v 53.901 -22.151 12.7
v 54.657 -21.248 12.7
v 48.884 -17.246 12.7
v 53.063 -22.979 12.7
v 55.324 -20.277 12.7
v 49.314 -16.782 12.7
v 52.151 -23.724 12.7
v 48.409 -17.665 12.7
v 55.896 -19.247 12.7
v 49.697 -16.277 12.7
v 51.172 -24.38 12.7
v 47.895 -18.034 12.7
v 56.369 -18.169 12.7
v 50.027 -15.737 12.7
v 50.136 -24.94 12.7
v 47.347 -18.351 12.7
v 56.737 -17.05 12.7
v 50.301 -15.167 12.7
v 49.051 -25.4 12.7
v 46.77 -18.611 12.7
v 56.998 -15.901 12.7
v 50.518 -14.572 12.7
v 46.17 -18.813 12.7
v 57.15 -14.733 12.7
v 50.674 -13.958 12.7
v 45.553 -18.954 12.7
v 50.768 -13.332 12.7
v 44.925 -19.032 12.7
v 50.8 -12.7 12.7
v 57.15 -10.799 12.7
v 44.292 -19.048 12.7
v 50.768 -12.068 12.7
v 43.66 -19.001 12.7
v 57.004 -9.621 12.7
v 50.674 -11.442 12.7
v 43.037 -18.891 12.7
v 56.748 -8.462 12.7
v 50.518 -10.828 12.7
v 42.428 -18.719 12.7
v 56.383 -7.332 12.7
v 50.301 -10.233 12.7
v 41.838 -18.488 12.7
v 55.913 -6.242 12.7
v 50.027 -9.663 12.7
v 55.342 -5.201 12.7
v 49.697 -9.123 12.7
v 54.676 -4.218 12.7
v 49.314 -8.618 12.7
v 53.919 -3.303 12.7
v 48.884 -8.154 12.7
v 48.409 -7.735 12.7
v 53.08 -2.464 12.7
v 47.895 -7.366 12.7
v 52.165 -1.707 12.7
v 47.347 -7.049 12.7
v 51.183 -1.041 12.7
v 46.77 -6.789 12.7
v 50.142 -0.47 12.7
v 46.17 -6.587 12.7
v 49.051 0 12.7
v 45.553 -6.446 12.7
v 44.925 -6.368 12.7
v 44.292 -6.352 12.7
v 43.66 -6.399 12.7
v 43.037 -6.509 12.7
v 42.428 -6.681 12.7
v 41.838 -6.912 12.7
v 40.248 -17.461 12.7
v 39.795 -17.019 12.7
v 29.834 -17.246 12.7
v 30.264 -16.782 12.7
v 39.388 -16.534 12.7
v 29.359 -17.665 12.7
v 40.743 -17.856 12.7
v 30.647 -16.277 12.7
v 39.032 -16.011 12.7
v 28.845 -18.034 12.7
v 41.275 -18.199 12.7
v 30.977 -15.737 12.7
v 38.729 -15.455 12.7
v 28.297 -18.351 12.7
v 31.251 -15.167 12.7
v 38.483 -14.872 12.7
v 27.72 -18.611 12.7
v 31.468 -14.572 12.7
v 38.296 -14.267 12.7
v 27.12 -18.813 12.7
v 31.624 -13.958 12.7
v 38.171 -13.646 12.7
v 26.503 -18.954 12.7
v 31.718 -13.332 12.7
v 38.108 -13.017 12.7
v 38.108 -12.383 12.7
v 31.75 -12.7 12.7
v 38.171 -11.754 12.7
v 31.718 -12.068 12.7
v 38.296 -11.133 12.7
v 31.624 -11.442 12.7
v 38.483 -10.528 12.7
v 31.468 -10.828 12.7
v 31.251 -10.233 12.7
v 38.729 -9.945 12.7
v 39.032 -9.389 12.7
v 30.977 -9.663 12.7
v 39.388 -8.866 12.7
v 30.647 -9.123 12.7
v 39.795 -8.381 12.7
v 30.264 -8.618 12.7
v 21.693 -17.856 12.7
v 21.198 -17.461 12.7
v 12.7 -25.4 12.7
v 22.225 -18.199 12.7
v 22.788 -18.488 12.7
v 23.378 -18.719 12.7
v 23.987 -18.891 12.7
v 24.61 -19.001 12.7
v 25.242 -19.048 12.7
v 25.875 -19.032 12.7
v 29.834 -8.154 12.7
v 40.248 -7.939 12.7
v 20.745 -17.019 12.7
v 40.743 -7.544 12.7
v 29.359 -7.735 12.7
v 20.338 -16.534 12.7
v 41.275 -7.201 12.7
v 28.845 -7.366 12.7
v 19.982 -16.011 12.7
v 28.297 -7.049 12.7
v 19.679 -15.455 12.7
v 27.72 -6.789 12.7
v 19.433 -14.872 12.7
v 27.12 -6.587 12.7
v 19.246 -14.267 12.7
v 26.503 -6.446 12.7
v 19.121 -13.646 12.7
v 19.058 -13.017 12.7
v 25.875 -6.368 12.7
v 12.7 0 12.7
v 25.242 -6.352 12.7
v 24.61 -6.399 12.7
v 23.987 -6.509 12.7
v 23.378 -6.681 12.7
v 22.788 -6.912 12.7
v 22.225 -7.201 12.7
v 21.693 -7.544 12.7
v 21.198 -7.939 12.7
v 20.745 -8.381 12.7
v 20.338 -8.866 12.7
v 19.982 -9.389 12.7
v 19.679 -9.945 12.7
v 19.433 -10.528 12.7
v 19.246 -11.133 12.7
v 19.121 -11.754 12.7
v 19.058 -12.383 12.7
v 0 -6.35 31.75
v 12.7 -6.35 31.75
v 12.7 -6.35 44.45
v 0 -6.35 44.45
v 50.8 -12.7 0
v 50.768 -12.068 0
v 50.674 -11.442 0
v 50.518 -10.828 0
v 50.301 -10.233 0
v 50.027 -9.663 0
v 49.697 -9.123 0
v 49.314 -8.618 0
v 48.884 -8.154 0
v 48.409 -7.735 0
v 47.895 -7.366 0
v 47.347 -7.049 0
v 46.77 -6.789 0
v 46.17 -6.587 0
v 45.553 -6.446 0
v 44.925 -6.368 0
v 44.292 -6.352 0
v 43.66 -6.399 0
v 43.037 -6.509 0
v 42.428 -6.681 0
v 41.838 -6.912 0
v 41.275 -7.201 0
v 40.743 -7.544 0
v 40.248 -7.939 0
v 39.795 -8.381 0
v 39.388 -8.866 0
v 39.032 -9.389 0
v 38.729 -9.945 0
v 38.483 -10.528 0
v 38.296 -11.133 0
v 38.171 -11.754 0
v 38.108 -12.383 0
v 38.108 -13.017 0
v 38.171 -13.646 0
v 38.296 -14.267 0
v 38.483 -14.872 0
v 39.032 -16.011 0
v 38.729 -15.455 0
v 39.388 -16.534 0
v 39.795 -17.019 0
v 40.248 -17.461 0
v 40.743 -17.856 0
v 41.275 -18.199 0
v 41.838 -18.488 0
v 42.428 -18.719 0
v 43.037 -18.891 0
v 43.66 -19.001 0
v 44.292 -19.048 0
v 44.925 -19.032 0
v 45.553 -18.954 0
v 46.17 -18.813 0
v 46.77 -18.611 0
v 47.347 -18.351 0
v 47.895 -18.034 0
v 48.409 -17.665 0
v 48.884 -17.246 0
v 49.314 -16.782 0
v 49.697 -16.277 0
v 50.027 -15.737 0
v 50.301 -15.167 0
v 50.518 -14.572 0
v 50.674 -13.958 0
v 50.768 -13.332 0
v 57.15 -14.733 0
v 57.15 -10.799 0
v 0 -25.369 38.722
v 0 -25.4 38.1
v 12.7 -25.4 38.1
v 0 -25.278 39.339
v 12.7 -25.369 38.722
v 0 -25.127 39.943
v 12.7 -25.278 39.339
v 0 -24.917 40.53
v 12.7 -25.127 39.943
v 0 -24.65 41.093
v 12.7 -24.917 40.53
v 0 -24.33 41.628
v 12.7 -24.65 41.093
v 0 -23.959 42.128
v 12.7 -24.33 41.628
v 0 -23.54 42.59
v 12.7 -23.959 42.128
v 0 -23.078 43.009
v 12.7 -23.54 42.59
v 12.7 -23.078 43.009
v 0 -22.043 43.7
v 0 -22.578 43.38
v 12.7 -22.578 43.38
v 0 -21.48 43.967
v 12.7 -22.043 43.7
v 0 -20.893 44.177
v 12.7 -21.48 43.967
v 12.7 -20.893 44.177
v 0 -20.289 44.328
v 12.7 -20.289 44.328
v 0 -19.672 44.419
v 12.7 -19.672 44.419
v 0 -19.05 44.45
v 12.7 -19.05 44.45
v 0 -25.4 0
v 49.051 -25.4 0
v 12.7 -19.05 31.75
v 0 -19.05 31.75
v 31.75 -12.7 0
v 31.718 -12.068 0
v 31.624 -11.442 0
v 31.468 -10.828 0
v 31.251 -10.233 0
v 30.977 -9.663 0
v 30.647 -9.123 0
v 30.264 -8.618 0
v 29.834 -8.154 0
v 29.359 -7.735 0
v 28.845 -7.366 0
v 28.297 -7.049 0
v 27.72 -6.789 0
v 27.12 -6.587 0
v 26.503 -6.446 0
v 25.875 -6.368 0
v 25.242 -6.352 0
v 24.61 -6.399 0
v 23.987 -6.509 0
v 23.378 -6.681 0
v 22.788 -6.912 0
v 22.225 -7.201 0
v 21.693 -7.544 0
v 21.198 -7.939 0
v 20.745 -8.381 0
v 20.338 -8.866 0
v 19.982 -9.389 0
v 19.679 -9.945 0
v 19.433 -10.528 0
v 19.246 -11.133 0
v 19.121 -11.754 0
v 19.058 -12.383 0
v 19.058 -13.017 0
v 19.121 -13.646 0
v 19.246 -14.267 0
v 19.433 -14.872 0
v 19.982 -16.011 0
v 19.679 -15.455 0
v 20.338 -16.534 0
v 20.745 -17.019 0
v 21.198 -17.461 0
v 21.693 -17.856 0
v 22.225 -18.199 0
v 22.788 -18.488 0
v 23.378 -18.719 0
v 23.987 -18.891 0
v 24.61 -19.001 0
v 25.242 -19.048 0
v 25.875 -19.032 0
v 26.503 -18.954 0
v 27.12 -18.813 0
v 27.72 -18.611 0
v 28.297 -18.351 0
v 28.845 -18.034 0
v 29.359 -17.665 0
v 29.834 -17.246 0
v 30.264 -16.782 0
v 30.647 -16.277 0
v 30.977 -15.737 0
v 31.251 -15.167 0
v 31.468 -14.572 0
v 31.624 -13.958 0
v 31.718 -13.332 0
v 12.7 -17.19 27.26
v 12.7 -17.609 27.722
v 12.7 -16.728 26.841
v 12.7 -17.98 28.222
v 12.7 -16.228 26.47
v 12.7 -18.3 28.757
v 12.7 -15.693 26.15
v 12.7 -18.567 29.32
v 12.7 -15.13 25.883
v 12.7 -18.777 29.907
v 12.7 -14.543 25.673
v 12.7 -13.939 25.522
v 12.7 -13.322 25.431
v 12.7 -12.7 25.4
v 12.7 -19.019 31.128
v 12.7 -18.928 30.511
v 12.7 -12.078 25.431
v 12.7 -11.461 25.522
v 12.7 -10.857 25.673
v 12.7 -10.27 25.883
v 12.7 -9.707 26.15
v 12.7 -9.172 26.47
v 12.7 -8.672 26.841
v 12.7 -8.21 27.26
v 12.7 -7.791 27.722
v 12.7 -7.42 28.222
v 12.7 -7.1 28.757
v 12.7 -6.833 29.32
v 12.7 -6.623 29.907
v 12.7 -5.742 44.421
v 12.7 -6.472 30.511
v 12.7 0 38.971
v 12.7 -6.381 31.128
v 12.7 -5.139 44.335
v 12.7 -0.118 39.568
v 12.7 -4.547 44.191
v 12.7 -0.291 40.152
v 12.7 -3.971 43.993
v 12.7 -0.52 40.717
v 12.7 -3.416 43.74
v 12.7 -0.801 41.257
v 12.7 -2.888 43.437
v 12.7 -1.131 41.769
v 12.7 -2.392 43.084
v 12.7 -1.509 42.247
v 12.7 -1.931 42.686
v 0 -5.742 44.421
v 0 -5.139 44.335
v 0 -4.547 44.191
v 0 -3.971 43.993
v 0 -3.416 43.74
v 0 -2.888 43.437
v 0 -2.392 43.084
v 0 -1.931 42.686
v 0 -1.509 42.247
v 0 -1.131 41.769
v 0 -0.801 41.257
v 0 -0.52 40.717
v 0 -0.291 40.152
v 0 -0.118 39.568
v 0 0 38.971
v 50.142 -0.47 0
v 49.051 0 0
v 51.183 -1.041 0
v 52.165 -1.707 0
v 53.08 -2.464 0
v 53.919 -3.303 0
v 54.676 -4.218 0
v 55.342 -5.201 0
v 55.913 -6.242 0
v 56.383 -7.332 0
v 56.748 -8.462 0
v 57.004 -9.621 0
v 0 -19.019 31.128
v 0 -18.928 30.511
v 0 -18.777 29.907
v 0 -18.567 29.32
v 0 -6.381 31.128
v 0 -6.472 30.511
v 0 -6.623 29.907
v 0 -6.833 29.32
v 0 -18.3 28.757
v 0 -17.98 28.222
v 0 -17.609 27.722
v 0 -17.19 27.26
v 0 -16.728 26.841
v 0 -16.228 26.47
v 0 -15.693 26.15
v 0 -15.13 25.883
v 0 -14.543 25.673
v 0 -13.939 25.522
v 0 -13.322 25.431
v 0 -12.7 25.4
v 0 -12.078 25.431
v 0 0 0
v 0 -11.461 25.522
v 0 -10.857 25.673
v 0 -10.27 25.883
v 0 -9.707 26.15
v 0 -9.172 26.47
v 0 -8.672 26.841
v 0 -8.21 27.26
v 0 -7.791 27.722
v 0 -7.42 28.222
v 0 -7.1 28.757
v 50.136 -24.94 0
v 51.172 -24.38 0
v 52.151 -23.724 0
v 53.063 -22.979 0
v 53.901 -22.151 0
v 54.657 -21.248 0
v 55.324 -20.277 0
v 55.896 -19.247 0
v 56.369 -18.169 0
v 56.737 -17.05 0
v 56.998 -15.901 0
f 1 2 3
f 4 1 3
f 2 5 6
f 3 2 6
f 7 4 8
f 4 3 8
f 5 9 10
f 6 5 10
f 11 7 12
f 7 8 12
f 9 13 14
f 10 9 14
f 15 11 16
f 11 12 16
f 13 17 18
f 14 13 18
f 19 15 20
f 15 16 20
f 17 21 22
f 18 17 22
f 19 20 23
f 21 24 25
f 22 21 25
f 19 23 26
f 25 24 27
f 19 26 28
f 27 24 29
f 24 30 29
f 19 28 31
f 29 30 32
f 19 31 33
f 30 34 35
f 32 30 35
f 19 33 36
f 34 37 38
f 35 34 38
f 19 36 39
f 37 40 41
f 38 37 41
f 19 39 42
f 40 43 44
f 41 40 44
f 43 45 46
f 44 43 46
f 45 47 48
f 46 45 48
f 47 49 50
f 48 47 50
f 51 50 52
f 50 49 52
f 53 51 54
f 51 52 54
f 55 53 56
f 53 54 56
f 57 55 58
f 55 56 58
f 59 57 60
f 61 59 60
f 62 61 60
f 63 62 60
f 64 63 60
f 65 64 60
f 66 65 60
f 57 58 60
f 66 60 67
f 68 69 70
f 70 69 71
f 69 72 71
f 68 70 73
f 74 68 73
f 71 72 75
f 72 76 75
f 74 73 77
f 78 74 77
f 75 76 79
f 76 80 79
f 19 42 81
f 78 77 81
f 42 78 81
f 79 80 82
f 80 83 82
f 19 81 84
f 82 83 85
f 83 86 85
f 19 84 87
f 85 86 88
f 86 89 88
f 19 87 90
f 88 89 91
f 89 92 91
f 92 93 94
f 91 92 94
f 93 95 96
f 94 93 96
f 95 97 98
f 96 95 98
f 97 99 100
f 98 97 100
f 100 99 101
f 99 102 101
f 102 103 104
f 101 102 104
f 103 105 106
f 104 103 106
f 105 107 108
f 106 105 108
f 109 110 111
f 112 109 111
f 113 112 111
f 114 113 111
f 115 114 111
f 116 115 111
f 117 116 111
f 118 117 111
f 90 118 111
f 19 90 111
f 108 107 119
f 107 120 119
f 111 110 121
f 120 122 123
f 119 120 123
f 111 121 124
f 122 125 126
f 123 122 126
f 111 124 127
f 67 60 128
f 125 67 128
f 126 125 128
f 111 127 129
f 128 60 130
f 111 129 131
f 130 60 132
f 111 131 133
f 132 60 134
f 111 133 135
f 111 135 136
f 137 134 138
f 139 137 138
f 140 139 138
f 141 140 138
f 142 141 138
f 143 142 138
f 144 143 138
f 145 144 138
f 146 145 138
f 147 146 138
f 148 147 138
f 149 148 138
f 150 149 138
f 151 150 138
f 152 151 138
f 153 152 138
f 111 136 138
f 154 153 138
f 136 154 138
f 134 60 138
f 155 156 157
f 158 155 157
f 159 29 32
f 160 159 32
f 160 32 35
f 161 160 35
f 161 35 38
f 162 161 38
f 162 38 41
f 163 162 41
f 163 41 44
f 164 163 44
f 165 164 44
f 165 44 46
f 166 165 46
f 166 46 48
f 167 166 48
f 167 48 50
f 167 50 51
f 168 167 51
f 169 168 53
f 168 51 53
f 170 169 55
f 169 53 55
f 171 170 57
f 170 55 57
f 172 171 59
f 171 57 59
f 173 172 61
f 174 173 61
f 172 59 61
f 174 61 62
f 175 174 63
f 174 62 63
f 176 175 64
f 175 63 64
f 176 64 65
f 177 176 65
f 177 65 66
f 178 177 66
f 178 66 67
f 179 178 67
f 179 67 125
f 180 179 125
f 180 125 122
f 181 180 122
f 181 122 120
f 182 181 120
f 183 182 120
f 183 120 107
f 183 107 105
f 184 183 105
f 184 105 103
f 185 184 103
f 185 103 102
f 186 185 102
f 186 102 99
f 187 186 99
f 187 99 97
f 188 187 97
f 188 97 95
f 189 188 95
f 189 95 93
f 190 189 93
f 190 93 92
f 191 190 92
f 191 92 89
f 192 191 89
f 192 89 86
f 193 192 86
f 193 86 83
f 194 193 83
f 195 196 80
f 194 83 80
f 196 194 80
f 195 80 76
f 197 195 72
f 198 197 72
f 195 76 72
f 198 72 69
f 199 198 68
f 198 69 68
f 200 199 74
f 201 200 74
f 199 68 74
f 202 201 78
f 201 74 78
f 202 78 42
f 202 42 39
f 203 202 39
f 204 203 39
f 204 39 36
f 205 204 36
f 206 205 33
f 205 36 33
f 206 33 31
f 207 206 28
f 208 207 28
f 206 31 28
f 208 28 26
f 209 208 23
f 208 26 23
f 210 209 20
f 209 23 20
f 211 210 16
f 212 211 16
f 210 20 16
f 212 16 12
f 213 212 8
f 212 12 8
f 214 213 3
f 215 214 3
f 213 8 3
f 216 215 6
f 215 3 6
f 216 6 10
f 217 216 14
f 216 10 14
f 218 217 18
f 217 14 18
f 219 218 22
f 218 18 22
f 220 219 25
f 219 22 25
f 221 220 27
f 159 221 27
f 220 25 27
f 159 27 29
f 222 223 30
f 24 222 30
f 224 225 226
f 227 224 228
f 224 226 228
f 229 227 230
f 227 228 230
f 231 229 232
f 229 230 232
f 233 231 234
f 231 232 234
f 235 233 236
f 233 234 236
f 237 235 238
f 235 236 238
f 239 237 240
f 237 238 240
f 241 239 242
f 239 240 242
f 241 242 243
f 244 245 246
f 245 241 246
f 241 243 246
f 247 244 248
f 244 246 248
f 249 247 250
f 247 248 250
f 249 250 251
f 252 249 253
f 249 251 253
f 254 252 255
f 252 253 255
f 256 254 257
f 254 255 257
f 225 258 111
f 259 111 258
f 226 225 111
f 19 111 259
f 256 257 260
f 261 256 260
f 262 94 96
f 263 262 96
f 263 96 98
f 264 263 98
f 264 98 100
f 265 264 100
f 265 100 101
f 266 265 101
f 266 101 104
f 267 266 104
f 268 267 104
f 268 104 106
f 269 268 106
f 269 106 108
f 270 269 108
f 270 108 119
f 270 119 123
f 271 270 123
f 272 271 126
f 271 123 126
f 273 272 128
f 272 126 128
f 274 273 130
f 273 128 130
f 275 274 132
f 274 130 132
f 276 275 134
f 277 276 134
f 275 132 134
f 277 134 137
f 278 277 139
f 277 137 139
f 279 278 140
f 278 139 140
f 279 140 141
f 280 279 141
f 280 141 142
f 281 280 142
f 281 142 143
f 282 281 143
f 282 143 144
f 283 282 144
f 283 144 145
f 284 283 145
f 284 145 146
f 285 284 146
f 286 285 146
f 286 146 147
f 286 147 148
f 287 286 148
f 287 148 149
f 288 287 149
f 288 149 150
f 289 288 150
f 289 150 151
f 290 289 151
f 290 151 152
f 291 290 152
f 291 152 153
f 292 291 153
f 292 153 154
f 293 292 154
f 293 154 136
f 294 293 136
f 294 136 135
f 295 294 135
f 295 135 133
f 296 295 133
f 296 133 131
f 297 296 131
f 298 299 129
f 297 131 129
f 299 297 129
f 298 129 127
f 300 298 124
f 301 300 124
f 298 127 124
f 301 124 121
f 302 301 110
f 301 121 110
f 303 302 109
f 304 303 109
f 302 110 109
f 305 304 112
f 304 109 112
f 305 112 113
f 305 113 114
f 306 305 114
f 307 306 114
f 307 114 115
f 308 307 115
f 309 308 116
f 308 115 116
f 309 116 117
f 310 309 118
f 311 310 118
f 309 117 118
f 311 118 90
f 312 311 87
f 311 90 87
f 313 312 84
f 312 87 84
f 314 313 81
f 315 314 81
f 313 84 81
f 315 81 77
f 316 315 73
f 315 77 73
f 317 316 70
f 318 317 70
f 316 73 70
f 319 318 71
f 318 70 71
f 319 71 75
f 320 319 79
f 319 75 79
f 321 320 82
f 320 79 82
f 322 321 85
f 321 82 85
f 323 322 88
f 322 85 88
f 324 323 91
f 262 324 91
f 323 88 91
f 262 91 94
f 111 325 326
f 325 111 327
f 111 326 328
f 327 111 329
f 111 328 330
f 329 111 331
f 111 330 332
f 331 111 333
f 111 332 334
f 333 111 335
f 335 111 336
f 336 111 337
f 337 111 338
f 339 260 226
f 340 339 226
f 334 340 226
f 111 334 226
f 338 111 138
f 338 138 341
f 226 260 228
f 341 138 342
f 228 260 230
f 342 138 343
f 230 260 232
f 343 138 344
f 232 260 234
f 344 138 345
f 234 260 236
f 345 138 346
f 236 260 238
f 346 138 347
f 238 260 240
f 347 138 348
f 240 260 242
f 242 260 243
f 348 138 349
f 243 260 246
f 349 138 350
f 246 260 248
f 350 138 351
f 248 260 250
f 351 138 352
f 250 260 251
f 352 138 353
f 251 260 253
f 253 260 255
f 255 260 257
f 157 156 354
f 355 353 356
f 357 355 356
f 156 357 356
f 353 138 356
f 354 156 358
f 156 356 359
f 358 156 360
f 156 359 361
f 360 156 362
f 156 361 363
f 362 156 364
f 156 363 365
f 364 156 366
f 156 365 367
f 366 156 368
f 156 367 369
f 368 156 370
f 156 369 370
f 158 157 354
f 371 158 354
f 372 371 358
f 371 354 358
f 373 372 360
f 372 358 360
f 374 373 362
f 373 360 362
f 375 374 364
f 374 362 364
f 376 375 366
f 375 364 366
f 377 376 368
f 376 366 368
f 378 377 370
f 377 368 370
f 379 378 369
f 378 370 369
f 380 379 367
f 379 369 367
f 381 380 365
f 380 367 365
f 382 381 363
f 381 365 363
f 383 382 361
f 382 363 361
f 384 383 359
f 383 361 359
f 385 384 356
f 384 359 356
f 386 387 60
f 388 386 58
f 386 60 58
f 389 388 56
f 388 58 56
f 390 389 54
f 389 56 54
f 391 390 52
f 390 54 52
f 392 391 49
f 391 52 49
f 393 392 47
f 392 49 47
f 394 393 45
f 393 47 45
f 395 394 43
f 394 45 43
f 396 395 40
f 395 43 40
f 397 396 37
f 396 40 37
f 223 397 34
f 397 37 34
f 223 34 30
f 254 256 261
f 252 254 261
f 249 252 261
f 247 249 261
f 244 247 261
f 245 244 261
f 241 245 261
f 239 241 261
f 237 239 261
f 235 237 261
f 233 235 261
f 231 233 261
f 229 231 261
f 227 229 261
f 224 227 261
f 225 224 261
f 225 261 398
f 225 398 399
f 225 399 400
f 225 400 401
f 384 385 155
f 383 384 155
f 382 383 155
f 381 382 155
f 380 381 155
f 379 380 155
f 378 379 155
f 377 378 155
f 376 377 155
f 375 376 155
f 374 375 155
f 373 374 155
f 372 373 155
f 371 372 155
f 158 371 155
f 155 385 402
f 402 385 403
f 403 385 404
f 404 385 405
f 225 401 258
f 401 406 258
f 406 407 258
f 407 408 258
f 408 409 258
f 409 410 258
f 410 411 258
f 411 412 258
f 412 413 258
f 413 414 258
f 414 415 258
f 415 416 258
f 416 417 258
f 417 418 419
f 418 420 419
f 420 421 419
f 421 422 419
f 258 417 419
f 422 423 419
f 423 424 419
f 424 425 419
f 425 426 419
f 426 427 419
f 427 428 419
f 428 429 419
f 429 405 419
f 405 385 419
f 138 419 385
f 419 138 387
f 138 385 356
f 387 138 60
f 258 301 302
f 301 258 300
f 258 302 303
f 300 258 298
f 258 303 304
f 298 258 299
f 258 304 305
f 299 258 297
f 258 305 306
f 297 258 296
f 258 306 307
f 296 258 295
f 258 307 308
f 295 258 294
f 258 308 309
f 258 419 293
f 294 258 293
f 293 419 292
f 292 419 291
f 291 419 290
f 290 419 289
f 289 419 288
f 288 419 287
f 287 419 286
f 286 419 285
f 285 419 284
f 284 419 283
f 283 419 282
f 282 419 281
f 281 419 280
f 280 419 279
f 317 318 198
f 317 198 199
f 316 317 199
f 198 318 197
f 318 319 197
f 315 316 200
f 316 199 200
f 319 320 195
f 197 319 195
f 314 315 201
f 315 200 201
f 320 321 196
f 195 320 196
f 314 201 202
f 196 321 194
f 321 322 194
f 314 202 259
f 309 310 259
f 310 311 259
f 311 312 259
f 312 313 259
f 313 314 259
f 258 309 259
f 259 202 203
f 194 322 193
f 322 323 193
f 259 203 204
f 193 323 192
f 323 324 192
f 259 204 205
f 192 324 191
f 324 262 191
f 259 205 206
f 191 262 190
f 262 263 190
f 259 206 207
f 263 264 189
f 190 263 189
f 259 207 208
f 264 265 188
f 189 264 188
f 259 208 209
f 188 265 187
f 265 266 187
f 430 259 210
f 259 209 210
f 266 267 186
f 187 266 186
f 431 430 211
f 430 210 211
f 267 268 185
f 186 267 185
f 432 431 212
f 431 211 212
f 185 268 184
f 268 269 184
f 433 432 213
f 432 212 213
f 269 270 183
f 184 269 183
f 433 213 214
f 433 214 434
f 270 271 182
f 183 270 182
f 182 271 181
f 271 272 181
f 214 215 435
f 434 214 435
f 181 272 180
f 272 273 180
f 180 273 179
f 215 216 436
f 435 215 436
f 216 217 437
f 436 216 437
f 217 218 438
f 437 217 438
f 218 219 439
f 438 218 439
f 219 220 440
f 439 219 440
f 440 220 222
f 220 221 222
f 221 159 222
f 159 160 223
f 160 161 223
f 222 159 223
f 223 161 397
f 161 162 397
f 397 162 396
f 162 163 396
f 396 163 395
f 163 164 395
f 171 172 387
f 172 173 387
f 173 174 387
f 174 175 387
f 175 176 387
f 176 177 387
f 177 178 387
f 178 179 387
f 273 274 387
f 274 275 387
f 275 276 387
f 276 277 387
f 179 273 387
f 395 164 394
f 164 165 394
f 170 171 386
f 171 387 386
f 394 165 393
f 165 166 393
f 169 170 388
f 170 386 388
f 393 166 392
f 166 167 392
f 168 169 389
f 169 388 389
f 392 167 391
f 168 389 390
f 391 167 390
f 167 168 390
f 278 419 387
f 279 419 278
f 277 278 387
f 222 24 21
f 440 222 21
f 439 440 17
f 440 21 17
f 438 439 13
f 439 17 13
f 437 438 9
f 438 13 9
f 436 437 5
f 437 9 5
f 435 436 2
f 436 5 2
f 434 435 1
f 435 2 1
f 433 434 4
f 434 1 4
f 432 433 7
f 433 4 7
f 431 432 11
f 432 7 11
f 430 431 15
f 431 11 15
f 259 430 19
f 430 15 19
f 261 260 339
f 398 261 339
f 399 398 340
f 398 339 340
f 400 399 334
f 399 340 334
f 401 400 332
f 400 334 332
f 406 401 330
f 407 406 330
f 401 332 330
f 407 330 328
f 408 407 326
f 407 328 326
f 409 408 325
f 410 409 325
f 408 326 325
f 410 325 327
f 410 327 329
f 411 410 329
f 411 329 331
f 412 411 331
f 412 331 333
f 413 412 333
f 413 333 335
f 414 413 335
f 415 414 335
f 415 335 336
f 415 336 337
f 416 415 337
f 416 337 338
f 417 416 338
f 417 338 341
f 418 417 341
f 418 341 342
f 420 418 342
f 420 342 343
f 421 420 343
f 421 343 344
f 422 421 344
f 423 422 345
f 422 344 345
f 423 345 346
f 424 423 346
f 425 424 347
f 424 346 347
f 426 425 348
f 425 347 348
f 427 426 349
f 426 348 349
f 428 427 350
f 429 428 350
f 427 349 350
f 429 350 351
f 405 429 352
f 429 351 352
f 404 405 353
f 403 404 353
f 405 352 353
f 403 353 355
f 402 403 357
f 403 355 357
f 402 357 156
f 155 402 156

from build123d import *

# Parameters (mm, degrees)
F1_DEPTH = 25.4
F3_DEPTH = 25.4
F5_DEPTH = 25.4
F6_R     = 6.35
F7_DEPTH = 25.4
F9_DEPTH = 25.4


with BuildPart() as f1:
    # F0 (on Front) → F1 (new body)
    with BuildSketch(Plane.XZ):
        Polygon((0, 44.45), (0, 0), (57.15, 0), (57.15, 12.7), (12.7, 12.7), (12.7, 44.45), align=None)
    extrude(amount=F1_DEPTH)

    # F2 (on face) → F3 (cut)
    with BuildSketch(Plane.YZ.offset(12.7)):
        with BuildLine():
            ThreePointArc((-19.05, 31.75), (-12.7, 25.4), (-6.35, 31.75))
            ThreePointArc((-6.35, 31.75), (-12.7, 38.1), (-19.05, 31.75))
        make_face()
        with BuildLine():
            ThreePointArc((-19.05, 31.75), (-12.7, 38.1), (-6.35, 31.75))
            Line((-6.35, 31.75), (-6.35, 44.45))
            Line((-6.35, 44.45), (-19.05, 44.45))
            Line((-19.05, 44.45), (-19.05, 31.75))
        make_face()
    extrude(amount=-F3_DEPTH, mode=Mode.SUBTRACT)

    # F4 (on face) → F5 (cut)
    with BuildSketch(Plane.YZ.offset(12.7)):
        with BuildLine():
            Line((-25.4, 44.45), (-25.4, 38.1))
            ThreePointArc((-25.4, 38.1), (-23.540128, 42.590128), (-19.05, 44.45))
            Line((-19.05, 44.45), (-25.4, 44.45))
        make_face()
        with BuildLine():
            Line((0, 44.45), (-6.35, 44.45))
            ThreePointArc((-6.35, 44.45), (-2.156385, 42.890804), (0, 38.970664))
            Line((0, 38.970664), (0, 44.45))
        make_face()
    extrude(amount=-F5_DEPTH, mode=Mode.SUBTRACT)

    # F6 (on face) → F7 (cut)
    with BuildSketch(Plane.XY.offset(12.7)):
        with Locations((44.45, -12.7)):
            Circle(F6_R)
        with Locations((25.4, -12.7)):
            Circle(F6_R)
    extrude(amount=-F7_DEPTH, mode=Mode.SUBTRACT)

    # F8 (on face) → F9 (cut)
    with BuildSketch(Plane.XY.offset(12.7)):
        with BuildLine():
            Line((57.15, -25.4), (57.15, -14.733049))
            ThreePointArc((57.15, -14.733049), (54.656516, -21.24776), (49.051356, -25.4))
            Line((49.051356, -25.4), (57.15, -25.4))
        make_face()
        with BuildLine():
            ThreePointArc((57.15, -14.733049), (57.191553, -13.716524), (57.15, -12.7))
            Line((57.15, -12.7), (57.15, -14.733049))
        make_face()
        with BuildLine():
            ThreePointArc((57.15, -12.7), (57.186039, -11.749483), (57.15, -10.798966))
            Line((57.15, -10.798966), (57.15, -12.7))
        make_face()
        with BuildLine():
            Line((57.15, 0), (49.051356, 0))
            ThreePointArc((49.051356, 0), (54.675771, -4.218247), (57.15, -10.798966))
            Line((57.15, -10.798966), (57.15, 0))
        make_face()
    extrude(amount=-F9_DEPTH, mode=Mode.SUBTRACT)


solid = f1.part
